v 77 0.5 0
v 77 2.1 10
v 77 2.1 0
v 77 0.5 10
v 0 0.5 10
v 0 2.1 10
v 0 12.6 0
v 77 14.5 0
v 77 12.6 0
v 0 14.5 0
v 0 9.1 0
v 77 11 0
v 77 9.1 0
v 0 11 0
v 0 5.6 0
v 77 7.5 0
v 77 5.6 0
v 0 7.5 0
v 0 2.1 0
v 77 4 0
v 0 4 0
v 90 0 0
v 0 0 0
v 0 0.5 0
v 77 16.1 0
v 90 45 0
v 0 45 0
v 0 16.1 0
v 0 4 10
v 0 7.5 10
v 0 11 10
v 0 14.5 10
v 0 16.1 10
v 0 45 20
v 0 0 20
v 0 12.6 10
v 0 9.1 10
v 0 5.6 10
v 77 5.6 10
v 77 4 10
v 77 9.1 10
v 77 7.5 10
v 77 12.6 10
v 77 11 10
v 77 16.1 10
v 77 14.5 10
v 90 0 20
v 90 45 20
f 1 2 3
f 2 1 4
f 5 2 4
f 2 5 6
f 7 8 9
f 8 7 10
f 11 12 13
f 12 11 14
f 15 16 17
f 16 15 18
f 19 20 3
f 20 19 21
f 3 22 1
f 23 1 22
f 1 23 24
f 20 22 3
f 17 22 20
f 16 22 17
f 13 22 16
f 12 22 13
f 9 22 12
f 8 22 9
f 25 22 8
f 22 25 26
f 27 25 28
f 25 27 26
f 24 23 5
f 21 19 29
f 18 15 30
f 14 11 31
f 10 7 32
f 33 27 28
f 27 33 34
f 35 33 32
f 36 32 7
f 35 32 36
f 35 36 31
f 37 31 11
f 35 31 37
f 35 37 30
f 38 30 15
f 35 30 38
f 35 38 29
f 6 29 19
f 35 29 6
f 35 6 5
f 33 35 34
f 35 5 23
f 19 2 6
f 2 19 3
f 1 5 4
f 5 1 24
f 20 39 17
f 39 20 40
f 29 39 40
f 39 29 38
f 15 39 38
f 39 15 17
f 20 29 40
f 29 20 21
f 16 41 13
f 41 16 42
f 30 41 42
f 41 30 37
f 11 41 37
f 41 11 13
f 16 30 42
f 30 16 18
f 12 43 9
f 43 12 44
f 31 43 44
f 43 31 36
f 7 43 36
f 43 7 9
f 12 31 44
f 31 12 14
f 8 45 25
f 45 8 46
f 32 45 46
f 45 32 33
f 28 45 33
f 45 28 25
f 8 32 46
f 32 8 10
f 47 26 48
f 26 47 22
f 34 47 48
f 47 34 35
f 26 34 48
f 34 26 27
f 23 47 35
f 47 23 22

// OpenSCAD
// Drying rack for 10 microscope slides.
// Base: 90 x 45 x 20 mm.
// 10 slots: 77 x 1.6 x 10 mm, spaced 3.5 mm C-C in Y, centred on block.

$fn = 64;

// Base dimensions
L_base = 90;
W_base = 45;
H_base = 20;

// Slot dimensions
N_slots = 10;
slot_len = 77;
slot_w   = 1.6;
slot_deep = 10;
slot_gap = 3.5;

// Calculate slot positions
// Total width of slots = N_slots * slot_w
// Total width of gaps = (N_slots - 1) * slot_gap
// Total occupied width = N_slots * slot_w + (N_slots - 1) * slot_gap
// Remaining width for margins = W_base - Total occupied width
// Margin per side = Remaining width / 2

total_occupied = (N_slots * slot_w) + ((N_slots - 1) * slot_gap);
margin = (W_base - total_occupied) / 2;

// Generate Y positions for the 10 slots
// Positions are centred on the origin in Y
// y_pos[i] = margin + (i - (N_slots-1)/2) * slot_gap
slot_positions = [for (i = [0 : N_slots - 1]) margin + (i - (N_slots - 1) / 2) * slot_gap];

difference() {
    // Main block
    translate([0, 0, 0]) cube([L_base, W_base, H_base]);
    
    // Cut slots
    for (y = slot_positions) {
        translate([0, y, 0]) cube([slot_len, slot_w, slot_deep]);
    }
}
